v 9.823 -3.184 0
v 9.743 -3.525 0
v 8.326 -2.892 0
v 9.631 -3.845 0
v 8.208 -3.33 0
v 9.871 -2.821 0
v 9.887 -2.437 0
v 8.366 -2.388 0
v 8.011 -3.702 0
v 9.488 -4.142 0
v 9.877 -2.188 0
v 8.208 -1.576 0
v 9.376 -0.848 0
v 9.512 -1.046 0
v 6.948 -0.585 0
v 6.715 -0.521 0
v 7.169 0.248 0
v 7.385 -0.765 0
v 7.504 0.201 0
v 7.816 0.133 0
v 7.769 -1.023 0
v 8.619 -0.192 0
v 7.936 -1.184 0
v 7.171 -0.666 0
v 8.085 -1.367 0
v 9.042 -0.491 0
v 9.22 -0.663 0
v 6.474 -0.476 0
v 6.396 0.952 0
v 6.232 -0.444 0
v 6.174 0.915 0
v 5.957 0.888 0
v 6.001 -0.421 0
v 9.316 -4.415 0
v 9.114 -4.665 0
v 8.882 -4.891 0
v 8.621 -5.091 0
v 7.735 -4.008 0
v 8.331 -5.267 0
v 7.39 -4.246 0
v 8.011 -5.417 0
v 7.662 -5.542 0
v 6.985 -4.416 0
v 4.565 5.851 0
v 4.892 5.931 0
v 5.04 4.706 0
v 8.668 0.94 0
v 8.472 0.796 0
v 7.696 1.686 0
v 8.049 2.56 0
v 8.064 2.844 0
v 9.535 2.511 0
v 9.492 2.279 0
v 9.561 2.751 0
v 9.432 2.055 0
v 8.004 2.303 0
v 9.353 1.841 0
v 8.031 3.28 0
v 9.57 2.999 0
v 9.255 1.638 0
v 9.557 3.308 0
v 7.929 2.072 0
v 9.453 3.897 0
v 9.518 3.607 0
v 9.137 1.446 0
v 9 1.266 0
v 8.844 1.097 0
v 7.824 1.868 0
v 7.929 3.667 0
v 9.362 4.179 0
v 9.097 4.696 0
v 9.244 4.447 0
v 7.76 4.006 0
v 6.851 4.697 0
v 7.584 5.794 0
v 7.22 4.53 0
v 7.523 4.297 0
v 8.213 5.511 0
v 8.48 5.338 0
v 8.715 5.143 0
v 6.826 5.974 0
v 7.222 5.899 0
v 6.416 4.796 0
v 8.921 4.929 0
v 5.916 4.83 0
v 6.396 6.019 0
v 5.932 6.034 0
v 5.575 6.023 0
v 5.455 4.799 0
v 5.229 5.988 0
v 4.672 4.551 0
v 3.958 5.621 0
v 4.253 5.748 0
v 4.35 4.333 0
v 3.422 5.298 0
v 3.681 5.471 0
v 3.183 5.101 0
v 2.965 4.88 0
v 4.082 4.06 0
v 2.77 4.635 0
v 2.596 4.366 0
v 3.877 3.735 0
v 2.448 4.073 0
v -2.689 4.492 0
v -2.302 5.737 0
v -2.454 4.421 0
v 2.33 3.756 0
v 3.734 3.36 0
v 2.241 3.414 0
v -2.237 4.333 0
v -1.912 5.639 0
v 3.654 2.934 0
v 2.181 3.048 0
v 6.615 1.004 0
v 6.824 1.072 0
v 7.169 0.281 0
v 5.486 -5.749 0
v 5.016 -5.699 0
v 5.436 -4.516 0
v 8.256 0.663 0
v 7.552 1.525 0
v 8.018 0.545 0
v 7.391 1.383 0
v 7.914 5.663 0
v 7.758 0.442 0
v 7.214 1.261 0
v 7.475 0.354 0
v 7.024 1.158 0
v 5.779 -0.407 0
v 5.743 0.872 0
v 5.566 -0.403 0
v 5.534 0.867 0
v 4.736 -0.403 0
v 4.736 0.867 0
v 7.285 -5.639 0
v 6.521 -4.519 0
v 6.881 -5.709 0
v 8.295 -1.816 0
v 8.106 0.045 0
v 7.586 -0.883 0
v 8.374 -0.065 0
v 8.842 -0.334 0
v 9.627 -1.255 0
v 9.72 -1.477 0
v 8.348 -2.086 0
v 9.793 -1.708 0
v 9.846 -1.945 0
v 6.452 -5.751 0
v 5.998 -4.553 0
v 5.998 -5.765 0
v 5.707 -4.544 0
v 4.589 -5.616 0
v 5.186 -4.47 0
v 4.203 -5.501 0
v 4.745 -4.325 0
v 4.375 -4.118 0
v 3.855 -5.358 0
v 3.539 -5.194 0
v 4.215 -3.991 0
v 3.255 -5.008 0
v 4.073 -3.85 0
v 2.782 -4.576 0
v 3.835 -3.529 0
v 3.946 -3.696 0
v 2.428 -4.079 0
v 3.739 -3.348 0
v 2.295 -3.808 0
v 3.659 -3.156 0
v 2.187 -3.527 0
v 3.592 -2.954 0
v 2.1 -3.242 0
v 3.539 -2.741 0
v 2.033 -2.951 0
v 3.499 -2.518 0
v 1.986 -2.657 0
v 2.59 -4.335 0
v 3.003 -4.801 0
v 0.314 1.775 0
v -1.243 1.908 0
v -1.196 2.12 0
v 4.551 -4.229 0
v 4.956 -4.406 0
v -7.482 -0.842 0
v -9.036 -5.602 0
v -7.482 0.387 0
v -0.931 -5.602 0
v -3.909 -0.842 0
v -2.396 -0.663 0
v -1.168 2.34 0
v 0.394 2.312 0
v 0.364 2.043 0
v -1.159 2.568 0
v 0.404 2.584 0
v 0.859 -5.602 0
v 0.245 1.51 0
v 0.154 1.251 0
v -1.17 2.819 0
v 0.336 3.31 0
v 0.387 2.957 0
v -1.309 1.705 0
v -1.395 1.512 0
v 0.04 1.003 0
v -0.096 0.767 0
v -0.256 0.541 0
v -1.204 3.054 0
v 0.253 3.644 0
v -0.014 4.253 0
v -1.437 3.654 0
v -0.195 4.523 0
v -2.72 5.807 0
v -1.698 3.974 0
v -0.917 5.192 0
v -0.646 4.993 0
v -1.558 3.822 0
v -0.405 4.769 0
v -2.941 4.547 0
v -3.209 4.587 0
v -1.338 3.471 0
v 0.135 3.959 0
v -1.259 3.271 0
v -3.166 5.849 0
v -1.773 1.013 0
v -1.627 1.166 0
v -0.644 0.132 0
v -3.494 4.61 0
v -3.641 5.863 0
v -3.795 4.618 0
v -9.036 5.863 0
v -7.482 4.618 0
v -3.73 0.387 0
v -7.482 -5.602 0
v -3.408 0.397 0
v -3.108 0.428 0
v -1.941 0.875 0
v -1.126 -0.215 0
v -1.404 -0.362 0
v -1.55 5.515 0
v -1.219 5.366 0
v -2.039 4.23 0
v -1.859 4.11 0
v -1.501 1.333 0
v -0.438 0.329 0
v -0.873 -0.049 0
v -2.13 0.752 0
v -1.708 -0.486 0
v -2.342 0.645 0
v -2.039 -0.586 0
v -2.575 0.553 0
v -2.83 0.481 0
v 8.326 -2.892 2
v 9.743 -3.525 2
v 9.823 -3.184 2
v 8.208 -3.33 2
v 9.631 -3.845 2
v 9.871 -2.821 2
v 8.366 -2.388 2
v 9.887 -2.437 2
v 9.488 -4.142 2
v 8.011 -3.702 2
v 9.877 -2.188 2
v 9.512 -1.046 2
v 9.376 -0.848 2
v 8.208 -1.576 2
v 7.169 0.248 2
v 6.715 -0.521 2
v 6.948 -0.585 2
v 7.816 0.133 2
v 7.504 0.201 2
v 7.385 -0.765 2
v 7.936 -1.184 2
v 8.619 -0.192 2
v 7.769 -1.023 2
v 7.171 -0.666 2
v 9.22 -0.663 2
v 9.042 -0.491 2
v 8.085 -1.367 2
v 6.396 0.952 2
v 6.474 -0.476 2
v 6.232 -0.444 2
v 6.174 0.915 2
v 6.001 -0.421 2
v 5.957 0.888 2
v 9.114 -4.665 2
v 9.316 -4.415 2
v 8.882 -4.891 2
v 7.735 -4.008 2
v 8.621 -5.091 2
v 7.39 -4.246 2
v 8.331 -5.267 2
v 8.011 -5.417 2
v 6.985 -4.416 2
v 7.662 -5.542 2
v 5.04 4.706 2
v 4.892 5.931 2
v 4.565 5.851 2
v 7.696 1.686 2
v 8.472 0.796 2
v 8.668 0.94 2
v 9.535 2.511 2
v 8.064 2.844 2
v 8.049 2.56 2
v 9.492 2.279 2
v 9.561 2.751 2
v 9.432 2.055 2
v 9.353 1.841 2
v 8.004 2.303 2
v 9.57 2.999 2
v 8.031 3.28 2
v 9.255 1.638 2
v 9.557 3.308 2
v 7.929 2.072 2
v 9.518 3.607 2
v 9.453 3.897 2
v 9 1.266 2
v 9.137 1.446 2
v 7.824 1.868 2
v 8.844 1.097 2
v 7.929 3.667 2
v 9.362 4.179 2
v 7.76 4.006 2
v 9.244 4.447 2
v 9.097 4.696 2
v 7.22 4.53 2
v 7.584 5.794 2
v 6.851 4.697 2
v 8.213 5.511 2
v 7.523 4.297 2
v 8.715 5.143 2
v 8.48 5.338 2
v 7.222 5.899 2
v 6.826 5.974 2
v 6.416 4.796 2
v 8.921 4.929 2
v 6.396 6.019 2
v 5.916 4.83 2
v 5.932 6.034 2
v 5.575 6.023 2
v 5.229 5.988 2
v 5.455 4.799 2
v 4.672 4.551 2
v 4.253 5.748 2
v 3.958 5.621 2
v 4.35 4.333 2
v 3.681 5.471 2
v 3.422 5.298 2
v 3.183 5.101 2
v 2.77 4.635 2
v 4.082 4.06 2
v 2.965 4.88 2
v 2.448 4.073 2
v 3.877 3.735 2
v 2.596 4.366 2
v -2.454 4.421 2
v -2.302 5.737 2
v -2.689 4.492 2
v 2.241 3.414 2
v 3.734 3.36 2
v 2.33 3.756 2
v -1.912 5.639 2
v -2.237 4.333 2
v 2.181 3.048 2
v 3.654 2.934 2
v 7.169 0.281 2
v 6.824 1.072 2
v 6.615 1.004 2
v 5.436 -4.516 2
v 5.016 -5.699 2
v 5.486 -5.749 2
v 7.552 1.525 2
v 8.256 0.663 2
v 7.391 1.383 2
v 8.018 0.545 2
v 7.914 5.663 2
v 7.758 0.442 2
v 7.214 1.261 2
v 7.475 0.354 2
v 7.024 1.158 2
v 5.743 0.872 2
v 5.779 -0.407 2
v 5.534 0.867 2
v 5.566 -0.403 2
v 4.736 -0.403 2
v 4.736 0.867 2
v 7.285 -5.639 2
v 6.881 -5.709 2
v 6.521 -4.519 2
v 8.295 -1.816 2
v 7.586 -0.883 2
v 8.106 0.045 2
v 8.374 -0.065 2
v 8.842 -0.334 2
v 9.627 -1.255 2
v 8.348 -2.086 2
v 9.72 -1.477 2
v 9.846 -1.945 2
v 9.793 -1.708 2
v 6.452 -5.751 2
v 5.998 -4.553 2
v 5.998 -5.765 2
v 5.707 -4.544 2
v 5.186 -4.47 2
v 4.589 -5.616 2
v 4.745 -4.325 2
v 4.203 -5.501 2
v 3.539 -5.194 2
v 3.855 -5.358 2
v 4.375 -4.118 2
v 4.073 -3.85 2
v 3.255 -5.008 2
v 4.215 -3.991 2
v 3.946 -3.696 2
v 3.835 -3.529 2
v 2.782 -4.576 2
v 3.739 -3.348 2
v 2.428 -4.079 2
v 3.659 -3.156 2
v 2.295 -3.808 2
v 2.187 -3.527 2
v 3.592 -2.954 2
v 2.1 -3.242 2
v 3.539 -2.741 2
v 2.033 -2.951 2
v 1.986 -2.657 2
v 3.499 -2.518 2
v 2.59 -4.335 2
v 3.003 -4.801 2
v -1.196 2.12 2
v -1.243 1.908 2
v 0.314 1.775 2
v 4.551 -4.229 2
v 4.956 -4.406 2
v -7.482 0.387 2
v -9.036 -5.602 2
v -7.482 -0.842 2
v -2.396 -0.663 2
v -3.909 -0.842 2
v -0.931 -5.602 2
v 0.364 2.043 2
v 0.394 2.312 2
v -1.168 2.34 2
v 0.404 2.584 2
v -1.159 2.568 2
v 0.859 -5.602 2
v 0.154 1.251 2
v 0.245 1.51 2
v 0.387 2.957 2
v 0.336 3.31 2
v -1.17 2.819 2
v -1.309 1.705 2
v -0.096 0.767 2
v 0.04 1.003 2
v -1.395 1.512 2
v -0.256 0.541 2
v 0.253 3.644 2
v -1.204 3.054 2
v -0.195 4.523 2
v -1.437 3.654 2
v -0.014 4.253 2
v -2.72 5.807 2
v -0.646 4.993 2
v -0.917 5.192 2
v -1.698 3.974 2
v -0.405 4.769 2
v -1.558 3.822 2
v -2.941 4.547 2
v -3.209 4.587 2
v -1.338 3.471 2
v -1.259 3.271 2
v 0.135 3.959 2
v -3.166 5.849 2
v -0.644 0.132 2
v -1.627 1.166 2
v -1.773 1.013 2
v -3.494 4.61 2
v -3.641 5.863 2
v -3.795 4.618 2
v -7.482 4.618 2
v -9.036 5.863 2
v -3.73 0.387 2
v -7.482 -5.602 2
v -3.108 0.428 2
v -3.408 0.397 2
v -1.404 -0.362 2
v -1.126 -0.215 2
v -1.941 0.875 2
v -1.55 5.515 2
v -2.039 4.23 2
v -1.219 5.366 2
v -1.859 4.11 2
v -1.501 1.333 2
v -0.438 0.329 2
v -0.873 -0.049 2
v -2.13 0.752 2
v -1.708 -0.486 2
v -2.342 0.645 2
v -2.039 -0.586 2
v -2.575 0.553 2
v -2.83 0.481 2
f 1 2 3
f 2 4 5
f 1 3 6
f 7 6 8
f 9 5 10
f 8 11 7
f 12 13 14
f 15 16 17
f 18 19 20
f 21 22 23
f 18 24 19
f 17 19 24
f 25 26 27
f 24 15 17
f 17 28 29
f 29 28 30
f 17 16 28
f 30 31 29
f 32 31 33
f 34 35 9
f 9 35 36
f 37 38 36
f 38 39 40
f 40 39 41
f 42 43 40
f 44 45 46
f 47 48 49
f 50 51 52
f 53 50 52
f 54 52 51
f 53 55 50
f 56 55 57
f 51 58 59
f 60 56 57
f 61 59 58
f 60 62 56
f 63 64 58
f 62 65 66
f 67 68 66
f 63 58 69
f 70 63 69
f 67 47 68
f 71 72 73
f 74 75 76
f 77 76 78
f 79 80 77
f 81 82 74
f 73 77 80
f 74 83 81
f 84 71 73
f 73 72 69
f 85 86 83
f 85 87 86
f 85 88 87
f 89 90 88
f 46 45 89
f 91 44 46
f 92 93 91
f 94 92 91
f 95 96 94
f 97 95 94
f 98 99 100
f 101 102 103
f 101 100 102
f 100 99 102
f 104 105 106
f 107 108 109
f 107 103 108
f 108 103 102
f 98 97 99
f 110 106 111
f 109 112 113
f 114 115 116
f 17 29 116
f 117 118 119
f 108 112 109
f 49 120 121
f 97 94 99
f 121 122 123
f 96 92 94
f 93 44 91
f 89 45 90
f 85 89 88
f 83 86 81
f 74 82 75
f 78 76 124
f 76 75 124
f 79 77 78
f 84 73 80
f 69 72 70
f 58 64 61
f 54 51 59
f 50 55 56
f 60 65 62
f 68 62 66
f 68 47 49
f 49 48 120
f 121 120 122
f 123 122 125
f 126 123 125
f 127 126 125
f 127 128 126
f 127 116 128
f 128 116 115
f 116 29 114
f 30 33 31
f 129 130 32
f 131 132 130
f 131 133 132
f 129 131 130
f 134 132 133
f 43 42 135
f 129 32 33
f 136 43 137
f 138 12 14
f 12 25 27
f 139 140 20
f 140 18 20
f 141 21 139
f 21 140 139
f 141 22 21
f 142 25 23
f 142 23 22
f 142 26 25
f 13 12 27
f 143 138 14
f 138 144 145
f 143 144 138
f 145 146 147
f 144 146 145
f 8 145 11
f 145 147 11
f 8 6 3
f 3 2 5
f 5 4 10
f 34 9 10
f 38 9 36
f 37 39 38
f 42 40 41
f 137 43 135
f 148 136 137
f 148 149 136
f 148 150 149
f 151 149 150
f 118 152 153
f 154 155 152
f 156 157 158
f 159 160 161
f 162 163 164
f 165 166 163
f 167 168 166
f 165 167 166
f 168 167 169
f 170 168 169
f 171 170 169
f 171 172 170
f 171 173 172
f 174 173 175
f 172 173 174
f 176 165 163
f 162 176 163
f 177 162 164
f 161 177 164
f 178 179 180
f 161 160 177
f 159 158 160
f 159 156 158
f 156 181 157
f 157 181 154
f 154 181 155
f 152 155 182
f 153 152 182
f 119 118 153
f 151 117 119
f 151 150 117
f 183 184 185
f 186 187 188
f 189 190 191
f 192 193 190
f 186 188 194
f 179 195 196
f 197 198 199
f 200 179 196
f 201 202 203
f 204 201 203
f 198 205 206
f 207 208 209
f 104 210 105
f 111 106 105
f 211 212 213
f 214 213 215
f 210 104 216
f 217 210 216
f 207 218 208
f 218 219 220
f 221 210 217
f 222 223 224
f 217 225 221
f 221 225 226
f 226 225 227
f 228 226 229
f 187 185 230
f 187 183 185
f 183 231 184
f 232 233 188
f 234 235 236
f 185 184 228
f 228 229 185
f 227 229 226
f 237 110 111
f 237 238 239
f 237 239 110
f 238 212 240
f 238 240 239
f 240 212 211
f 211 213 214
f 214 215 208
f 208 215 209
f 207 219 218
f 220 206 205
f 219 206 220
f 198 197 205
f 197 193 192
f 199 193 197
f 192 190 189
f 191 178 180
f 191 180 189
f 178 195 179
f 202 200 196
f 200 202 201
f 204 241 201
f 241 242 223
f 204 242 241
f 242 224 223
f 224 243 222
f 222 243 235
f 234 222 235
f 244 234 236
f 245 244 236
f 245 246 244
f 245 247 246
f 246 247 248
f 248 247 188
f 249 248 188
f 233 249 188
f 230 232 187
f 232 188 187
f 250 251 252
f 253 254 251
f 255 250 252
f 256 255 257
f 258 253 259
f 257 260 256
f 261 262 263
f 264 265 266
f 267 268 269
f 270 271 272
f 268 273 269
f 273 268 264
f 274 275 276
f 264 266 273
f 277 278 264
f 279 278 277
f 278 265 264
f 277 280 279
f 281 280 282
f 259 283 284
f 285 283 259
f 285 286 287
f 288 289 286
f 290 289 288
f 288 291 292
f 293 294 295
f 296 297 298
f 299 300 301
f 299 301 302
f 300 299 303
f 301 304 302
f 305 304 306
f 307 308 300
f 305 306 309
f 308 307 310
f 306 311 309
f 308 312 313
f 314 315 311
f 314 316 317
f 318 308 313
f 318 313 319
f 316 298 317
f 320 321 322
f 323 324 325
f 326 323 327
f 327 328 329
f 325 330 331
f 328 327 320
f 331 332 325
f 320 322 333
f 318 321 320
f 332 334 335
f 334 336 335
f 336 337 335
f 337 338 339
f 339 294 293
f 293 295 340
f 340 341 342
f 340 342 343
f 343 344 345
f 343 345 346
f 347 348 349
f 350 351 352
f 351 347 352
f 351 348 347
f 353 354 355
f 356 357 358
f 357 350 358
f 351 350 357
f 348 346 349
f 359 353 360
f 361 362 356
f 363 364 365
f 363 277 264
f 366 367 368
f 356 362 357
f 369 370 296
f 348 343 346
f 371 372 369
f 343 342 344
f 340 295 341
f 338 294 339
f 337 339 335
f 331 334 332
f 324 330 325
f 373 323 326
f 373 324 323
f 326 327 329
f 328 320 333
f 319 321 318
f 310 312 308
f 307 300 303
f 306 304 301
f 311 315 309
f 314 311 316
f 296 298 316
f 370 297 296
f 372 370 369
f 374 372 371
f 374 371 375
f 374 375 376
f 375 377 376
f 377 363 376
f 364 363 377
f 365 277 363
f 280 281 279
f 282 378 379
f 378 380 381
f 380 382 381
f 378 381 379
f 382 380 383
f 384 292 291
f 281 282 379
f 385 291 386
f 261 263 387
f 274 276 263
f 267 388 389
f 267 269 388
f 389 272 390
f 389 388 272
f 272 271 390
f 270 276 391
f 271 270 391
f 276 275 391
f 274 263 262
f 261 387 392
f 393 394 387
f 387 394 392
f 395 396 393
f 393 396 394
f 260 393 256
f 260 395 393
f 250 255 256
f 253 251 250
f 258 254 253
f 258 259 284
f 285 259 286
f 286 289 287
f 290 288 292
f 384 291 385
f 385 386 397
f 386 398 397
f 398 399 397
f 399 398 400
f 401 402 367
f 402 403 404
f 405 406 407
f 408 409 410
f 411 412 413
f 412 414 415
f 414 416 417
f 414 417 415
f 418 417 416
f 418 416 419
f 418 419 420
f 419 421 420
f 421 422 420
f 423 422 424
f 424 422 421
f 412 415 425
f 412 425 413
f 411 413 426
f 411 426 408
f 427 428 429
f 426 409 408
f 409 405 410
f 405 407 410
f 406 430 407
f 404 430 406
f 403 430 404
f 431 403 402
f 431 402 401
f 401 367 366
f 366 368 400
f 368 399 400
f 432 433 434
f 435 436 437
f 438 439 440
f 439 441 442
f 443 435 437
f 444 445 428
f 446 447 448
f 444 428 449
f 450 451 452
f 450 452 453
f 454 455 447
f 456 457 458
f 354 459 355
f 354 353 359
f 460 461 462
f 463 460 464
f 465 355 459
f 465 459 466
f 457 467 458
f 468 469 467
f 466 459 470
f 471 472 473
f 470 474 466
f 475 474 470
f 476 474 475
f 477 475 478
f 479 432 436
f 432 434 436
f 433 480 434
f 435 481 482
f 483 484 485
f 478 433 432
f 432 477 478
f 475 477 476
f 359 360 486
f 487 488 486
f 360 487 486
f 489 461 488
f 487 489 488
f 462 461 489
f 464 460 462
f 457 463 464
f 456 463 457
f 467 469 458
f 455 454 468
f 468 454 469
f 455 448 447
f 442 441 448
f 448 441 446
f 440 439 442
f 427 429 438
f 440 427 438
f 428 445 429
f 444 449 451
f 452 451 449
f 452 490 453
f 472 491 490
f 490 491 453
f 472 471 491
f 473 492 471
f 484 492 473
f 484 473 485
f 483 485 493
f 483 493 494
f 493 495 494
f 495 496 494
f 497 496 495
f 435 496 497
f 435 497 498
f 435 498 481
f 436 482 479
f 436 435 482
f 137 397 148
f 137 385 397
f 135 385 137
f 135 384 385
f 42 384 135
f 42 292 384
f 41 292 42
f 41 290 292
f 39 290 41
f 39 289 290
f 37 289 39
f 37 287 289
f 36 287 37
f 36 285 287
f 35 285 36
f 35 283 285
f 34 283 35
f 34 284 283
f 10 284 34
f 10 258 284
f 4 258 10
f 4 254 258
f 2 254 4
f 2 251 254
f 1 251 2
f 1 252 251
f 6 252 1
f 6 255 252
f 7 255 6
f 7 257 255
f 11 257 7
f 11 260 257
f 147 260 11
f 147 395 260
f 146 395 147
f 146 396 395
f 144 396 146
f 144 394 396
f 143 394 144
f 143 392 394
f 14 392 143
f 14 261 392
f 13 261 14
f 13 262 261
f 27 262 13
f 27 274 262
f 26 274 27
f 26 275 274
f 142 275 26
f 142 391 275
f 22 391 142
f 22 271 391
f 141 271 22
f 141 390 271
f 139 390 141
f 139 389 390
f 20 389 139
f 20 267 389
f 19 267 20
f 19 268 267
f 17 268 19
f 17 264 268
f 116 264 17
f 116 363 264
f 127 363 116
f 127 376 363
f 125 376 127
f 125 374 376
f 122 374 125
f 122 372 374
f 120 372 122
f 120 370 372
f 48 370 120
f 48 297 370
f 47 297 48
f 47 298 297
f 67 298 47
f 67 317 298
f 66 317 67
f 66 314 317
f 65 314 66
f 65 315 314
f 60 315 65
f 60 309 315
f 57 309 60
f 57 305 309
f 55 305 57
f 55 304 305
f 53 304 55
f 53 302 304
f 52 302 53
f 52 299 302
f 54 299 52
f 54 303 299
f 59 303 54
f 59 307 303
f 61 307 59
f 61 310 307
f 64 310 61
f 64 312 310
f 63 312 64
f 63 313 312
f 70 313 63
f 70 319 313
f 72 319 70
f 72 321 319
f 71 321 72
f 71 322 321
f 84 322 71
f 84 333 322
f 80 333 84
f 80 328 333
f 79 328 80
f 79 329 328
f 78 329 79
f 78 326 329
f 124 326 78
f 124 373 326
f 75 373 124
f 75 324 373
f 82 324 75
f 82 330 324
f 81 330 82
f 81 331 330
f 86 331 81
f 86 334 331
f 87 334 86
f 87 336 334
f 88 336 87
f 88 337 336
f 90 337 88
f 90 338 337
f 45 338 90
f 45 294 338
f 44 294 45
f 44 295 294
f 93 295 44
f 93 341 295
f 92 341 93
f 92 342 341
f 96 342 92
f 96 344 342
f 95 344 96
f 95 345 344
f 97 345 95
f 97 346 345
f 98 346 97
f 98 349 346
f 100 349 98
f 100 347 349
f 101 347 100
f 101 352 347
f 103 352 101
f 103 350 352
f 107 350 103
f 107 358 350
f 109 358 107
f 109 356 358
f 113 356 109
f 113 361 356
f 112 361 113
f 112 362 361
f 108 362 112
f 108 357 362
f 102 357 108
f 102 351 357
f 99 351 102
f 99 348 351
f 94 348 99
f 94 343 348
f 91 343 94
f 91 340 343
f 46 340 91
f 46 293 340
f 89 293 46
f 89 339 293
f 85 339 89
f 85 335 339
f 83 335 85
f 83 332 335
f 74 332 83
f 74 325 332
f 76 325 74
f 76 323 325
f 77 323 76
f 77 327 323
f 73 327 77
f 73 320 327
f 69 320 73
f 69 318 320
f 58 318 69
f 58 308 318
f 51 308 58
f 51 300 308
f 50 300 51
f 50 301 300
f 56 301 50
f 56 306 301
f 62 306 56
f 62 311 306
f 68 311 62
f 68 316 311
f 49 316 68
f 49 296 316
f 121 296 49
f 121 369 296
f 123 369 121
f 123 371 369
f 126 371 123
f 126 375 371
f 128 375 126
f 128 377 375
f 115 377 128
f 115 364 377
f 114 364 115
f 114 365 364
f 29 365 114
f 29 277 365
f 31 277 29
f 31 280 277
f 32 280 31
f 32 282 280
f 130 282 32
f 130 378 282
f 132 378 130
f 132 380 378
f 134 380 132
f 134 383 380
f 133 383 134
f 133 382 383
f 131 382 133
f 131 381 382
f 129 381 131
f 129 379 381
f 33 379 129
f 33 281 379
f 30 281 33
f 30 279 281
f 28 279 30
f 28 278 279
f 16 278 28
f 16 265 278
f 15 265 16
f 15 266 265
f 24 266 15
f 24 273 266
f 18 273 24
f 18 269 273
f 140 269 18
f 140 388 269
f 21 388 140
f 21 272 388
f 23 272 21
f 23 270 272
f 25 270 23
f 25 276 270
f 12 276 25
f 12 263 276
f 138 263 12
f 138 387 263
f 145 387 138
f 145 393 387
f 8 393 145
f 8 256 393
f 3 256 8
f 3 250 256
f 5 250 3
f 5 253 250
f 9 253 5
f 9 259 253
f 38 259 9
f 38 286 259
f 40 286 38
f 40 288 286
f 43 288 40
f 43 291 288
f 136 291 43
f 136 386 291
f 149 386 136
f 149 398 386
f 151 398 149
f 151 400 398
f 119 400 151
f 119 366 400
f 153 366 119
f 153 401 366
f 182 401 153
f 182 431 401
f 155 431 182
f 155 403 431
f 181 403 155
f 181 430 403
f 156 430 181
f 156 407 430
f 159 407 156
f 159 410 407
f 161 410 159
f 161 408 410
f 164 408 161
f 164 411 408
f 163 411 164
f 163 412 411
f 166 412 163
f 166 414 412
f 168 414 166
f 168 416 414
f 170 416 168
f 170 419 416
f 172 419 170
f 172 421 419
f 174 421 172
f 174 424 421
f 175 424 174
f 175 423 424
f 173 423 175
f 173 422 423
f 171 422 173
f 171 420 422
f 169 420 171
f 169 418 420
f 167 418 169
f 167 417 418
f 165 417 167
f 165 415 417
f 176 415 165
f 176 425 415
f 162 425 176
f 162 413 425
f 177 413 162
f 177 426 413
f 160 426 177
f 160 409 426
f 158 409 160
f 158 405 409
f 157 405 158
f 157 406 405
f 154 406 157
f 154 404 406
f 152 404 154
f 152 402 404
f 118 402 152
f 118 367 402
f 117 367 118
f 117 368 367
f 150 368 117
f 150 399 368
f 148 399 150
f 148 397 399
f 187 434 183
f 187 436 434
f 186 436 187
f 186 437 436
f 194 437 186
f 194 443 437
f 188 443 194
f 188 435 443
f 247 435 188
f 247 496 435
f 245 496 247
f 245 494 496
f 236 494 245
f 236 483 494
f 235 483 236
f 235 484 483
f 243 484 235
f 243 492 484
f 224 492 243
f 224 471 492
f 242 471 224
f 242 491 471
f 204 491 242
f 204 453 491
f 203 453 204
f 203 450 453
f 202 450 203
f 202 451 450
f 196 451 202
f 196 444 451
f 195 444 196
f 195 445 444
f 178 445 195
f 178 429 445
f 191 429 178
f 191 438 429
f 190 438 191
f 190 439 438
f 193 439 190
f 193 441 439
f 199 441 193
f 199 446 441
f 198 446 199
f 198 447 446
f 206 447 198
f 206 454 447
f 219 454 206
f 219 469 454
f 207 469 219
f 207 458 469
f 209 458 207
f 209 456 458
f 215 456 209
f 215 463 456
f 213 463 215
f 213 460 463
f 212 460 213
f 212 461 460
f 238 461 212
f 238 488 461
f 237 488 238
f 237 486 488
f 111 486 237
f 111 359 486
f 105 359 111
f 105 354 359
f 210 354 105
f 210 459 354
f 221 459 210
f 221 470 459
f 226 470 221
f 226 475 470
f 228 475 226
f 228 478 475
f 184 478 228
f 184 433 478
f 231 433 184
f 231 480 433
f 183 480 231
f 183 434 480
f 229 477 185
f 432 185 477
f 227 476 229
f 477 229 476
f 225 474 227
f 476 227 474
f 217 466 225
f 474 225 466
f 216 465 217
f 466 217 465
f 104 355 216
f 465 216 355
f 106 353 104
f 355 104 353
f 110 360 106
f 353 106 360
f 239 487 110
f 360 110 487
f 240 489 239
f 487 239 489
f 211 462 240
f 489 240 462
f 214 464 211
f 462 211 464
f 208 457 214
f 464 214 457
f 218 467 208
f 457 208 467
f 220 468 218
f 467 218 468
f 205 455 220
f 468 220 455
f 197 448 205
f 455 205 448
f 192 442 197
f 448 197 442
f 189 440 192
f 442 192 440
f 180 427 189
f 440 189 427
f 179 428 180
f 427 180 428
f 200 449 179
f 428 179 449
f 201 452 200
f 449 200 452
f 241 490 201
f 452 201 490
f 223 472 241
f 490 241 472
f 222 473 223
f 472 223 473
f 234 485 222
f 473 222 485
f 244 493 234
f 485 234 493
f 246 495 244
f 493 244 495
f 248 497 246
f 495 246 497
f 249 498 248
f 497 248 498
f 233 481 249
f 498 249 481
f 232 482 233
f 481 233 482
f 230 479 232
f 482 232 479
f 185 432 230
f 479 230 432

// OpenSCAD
// text() with the bundled DejaVu Sans outline font: smooth, watertight glyphs
// that render correctly from any angle. Pass font="…ttf" to use another typeface
// (e.g. OpenSCAD's Liberation Sans) — the geometry pipeline is font-agnostic.
linear_extrude(2) text("R3", size = 12, halign = "center", valign = "center");
